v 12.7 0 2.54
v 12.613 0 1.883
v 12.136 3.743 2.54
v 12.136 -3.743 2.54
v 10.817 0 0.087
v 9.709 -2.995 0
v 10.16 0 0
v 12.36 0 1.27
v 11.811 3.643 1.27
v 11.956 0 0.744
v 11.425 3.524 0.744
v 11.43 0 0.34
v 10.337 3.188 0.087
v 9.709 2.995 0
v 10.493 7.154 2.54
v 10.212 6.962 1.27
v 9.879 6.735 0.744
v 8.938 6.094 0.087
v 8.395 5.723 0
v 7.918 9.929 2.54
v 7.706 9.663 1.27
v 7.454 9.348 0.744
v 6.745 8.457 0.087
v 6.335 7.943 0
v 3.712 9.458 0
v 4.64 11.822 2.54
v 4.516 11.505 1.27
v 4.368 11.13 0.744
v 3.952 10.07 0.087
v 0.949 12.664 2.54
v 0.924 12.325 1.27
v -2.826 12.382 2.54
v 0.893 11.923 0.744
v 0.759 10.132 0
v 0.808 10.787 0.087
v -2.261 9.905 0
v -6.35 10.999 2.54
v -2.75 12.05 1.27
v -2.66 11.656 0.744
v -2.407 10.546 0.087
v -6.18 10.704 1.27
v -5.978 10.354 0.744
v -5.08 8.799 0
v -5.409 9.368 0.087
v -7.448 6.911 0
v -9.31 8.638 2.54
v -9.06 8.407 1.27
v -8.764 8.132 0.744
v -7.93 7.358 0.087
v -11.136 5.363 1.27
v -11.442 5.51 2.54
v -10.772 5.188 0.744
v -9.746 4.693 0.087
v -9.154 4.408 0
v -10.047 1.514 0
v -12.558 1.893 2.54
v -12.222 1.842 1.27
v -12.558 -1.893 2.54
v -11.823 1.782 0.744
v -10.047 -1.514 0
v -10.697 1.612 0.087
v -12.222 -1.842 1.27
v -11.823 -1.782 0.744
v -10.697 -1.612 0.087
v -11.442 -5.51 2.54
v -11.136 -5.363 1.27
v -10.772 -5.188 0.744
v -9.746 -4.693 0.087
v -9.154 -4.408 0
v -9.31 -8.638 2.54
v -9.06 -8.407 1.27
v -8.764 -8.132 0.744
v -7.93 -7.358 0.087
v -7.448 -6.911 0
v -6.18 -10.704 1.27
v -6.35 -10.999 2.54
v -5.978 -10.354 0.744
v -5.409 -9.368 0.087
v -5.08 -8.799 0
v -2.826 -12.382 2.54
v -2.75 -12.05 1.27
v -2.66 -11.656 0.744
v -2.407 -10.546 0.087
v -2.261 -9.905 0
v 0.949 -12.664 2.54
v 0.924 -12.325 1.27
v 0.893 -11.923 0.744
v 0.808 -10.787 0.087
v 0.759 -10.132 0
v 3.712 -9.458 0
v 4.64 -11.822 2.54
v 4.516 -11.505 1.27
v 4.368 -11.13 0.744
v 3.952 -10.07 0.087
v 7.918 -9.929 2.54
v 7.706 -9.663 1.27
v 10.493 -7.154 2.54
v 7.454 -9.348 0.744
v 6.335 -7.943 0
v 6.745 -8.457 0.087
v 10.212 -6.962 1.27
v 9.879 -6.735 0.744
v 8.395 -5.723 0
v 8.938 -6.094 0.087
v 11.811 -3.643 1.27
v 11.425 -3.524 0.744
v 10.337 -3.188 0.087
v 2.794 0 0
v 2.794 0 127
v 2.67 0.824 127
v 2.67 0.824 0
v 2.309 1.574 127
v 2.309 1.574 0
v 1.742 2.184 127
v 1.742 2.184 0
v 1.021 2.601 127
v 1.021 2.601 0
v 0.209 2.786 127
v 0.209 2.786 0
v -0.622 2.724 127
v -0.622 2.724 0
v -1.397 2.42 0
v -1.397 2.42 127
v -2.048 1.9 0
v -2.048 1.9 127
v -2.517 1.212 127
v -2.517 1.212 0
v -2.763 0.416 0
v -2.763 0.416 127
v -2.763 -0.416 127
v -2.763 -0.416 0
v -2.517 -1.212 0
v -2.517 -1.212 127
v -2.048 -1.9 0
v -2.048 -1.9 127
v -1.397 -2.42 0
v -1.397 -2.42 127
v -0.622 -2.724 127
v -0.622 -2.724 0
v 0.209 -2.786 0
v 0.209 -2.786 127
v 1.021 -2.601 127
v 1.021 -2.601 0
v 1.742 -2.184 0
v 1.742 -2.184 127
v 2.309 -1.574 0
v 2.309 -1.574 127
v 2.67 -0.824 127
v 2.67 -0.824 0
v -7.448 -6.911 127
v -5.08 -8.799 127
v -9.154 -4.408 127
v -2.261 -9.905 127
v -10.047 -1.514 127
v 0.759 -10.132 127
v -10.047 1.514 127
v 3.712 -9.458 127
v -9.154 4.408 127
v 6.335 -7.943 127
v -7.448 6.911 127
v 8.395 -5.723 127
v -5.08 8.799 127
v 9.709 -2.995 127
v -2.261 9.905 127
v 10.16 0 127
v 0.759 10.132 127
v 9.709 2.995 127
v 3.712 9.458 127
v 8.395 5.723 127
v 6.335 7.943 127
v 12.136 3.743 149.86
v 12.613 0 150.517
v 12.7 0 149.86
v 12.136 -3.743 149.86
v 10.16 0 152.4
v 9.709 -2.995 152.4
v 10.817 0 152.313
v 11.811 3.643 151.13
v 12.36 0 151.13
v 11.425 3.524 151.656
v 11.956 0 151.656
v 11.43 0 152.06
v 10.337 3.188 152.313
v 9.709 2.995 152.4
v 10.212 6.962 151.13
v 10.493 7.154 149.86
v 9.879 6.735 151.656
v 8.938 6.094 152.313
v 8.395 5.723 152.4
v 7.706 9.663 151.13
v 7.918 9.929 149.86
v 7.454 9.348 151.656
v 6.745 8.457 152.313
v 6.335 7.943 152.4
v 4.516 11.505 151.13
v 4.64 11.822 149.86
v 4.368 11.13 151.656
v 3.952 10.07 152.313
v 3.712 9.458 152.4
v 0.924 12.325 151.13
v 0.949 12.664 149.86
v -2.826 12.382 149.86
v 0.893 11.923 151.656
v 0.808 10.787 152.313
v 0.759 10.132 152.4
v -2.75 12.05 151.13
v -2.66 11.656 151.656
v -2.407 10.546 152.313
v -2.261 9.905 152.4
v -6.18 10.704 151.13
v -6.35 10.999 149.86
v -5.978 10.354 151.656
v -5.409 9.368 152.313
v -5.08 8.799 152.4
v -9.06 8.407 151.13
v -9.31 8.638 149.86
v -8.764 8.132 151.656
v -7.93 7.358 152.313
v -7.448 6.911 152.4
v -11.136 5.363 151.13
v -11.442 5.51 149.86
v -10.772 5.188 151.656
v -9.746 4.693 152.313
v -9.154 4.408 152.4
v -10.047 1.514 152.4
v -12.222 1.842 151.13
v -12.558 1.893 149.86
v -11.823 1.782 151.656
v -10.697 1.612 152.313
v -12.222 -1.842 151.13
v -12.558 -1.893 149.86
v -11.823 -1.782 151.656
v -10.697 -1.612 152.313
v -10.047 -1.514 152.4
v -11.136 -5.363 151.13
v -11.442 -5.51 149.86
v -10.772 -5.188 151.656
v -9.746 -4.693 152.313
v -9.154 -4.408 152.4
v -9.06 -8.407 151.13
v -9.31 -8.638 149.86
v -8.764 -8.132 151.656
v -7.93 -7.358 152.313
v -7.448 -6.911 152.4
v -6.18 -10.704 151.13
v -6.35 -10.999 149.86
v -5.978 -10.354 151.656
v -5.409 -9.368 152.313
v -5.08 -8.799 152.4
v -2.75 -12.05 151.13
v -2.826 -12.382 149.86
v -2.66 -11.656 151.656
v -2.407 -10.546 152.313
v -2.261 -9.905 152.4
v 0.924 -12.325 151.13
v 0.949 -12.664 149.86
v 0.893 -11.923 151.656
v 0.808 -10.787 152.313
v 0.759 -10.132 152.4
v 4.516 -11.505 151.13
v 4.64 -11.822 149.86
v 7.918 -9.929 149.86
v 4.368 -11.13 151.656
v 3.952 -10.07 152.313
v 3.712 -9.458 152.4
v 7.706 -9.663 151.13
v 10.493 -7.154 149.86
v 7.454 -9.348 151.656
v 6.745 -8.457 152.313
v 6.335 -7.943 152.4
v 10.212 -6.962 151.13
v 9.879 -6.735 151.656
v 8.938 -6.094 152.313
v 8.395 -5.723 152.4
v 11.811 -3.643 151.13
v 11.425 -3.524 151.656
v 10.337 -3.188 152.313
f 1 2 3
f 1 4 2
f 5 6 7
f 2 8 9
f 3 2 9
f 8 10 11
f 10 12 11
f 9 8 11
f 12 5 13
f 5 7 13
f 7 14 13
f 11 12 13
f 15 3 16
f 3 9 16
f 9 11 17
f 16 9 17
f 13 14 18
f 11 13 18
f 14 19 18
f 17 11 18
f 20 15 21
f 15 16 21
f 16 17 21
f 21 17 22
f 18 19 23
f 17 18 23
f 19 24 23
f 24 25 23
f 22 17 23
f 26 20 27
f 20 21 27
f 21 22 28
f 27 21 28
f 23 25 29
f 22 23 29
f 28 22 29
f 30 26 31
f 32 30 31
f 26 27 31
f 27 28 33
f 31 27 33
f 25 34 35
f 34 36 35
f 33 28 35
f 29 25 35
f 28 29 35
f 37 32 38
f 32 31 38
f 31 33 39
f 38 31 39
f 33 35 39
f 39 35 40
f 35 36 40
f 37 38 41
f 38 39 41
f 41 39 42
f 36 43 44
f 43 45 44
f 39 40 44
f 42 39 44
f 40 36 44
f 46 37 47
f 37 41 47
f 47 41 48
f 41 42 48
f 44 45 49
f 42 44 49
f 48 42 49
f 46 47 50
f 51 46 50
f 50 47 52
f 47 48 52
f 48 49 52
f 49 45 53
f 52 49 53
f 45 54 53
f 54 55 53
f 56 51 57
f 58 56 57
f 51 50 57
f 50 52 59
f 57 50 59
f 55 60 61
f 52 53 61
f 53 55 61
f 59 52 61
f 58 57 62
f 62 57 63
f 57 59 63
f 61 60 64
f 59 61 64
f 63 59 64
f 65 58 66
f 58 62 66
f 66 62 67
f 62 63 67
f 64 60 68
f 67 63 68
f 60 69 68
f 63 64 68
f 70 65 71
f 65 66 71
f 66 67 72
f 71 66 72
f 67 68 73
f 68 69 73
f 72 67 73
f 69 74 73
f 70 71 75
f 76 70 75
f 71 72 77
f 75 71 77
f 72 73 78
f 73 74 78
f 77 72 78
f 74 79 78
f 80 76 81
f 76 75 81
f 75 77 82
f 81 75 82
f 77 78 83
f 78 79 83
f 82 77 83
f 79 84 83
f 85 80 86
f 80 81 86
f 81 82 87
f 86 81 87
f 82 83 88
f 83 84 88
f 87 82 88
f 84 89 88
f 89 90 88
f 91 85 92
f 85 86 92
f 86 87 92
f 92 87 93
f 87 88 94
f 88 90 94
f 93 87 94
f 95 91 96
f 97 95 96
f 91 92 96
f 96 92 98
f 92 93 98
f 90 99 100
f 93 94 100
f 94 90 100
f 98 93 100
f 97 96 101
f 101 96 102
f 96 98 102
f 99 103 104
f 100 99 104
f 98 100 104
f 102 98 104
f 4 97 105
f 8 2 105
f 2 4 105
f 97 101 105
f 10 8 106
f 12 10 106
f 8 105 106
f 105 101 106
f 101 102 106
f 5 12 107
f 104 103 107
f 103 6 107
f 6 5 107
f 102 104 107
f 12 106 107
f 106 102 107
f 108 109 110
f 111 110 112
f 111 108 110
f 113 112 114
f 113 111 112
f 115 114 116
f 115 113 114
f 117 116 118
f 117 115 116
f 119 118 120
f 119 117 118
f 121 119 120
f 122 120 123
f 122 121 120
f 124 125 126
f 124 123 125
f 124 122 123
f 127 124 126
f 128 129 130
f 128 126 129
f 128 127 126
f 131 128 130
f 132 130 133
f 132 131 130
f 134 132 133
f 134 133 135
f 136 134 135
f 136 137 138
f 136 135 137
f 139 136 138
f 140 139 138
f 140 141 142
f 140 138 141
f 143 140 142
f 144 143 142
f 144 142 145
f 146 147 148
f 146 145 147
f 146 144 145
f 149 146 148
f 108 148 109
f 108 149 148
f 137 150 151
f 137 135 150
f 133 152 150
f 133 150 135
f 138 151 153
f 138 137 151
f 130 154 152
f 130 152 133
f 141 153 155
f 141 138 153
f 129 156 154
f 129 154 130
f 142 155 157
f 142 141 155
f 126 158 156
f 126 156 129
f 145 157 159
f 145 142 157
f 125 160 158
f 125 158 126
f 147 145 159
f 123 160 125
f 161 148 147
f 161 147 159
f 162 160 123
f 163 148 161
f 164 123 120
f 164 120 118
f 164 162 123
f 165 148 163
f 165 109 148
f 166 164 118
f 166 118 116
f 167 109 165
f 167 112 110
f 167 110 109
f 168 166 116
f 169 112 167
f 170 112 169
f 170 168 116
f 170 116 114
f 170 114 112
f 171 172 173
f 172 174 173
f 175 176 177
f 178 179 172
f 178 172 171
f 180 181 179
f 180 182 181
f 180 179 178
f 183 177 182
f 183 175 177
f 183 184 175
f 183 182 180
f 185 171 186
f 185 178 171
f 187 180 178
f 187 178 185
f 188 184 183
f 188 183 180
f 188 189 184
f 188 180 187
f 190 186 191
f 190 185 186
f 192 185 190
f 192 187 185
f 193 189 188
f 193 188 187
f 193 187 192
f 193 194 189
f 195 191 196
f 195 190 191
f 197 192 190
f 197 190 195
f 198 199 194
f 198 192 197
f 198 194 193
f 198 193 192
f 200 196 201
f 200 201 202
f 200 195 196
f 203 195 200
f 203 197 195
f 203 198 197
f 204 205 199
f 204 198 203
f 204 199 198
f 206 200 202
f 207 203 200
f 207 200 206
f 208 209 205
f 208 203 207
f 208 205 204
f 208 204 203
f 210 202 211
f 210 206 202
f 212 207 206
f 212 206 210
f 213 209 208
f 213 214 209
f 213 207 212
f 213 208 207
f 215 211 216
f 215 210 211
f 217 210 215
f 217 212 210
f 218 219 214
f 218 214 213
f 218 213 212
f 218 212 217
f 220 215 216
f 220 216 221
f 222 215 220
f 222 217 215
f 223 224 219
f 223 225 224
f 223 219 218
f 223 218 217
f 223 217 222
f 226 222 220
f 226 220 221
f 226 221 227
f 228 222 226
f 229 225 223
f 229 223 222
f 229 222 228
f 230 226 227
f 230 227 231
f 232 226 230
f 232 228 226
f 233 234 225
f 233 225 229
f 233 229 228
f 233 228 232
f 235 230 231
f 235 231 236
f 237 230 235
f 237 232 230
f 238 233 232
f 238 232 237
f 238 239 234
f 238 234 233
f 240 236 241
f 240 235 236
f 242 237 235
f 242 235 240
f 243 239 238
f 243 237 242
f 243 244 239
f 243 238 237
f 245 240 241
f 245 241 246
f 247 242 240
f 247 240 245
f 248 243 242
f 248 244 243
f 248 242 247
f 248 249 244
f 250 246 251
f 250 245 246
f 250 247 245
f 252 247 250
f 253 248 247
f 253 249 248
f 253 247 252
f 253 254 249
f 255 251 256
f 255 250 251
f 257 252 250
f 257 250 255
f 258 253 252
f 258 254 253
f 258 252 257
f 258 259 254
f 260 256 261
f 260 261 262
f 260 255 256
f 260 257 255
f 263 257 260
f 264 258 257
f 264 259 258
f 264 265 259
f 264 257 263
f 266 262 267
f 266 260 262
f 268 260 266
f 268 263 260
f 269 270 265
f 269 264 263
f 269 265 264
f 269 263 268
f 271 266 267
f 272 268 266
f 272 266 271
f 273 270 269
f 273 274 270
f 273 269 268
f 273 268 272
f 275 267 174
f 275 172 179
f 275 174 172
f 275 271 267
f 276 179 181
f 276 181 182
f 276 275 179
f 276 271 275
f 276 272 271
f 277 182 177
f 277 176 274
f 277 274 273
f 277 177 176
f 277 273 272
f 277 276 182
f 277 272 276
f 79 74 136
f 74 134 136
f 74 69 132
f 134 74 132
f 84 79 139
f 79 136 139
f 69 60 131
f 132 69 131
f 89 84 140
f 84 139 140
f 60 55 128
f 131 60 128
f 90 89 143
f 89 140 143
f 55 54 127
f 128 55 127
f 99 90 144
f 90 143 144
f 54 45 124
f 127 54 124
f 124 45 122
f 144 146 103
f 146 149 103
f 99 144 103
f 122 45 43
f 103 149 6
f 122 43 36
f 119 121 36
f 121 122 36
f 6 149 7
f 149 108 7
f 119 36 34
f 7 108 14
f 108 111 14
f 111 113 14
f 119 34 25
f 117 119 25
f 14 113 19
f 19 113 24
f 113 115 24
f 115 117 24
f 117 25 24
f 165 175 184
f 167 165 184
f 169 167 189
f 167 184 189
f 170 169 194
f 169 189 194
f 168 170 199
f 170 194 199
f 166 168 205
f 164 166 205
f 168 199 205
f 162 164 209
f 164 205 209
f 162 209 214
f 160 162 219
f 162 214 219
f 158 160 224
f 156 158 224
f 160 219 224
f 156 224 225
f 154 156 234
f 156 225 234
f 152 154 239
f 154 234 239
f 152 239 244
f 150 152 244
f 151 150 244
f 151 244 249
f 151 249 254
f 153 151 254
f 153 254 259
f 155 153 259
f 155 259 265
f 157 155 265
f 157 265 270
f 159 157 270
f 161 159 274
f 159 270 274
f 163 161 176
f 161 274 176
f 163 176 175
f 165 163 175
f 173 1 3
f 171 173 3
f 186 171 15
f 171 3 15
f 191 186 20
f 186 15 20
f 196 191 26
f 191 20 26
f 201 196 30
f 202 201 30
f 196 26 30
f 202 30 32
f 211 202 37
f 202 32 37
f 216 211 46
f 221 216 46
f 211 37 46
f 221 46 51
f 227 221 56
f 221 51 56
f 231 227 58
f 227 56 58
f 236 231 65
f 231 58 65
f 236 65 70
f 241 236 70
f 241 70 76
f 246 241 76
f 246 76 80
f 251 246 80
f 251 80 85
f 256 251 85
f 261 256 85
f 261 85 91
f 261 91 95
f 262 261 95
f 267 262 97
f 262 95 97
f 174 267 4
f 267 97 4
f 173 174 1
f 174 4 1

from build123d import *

# Parameters (mm, degrees)
F0_R     = 12.7
F2_DEPTH = 152.4
F1_R     = 2.794
F3_DEPTH = 177.8
F4_R     = 2.54
F5_R     = 2.54
F6_DEPTH = 25.4


with BuildPart() as f2:
    # F0 (on Top) → F2 (new body)
    with BuildSketch(Plane.XY):
        Circle(F0_R)
    extrude(amount=F2_DEPTH)

    # F1 (on face) → F3 (cut)
    with BuildSketch(Plane.XY):
        Circle(F1_R)
    extrude(amount=F3_DEPTH, mode=Mode.SUBTRACT)

    # F4
    f4_edges = [f2.edges().sort_by_distance(p)[0] for p in [
        (-12.7, 0, 0),
    ]]
    fillet(f4_edges, radius=F4_R)

    # F5
    f5_edges = [f2.edges().sort_by_distance(p)[0] for p in [
        (-12.7, 0, 152.4),
    ]]
    fillet(f5_edges, radius=F5_R)

    # F6 (cut): a face of the model
    f6_faces = [f2.faces().sort_by_distance(p)[0] for p in [
        (-9.8726318041, 0, 152.4),
    ]]
    extrude(f6_faces, amount=-F6_DEPTH, mode=Mode.SUBTRACT)


solid = f2.part
